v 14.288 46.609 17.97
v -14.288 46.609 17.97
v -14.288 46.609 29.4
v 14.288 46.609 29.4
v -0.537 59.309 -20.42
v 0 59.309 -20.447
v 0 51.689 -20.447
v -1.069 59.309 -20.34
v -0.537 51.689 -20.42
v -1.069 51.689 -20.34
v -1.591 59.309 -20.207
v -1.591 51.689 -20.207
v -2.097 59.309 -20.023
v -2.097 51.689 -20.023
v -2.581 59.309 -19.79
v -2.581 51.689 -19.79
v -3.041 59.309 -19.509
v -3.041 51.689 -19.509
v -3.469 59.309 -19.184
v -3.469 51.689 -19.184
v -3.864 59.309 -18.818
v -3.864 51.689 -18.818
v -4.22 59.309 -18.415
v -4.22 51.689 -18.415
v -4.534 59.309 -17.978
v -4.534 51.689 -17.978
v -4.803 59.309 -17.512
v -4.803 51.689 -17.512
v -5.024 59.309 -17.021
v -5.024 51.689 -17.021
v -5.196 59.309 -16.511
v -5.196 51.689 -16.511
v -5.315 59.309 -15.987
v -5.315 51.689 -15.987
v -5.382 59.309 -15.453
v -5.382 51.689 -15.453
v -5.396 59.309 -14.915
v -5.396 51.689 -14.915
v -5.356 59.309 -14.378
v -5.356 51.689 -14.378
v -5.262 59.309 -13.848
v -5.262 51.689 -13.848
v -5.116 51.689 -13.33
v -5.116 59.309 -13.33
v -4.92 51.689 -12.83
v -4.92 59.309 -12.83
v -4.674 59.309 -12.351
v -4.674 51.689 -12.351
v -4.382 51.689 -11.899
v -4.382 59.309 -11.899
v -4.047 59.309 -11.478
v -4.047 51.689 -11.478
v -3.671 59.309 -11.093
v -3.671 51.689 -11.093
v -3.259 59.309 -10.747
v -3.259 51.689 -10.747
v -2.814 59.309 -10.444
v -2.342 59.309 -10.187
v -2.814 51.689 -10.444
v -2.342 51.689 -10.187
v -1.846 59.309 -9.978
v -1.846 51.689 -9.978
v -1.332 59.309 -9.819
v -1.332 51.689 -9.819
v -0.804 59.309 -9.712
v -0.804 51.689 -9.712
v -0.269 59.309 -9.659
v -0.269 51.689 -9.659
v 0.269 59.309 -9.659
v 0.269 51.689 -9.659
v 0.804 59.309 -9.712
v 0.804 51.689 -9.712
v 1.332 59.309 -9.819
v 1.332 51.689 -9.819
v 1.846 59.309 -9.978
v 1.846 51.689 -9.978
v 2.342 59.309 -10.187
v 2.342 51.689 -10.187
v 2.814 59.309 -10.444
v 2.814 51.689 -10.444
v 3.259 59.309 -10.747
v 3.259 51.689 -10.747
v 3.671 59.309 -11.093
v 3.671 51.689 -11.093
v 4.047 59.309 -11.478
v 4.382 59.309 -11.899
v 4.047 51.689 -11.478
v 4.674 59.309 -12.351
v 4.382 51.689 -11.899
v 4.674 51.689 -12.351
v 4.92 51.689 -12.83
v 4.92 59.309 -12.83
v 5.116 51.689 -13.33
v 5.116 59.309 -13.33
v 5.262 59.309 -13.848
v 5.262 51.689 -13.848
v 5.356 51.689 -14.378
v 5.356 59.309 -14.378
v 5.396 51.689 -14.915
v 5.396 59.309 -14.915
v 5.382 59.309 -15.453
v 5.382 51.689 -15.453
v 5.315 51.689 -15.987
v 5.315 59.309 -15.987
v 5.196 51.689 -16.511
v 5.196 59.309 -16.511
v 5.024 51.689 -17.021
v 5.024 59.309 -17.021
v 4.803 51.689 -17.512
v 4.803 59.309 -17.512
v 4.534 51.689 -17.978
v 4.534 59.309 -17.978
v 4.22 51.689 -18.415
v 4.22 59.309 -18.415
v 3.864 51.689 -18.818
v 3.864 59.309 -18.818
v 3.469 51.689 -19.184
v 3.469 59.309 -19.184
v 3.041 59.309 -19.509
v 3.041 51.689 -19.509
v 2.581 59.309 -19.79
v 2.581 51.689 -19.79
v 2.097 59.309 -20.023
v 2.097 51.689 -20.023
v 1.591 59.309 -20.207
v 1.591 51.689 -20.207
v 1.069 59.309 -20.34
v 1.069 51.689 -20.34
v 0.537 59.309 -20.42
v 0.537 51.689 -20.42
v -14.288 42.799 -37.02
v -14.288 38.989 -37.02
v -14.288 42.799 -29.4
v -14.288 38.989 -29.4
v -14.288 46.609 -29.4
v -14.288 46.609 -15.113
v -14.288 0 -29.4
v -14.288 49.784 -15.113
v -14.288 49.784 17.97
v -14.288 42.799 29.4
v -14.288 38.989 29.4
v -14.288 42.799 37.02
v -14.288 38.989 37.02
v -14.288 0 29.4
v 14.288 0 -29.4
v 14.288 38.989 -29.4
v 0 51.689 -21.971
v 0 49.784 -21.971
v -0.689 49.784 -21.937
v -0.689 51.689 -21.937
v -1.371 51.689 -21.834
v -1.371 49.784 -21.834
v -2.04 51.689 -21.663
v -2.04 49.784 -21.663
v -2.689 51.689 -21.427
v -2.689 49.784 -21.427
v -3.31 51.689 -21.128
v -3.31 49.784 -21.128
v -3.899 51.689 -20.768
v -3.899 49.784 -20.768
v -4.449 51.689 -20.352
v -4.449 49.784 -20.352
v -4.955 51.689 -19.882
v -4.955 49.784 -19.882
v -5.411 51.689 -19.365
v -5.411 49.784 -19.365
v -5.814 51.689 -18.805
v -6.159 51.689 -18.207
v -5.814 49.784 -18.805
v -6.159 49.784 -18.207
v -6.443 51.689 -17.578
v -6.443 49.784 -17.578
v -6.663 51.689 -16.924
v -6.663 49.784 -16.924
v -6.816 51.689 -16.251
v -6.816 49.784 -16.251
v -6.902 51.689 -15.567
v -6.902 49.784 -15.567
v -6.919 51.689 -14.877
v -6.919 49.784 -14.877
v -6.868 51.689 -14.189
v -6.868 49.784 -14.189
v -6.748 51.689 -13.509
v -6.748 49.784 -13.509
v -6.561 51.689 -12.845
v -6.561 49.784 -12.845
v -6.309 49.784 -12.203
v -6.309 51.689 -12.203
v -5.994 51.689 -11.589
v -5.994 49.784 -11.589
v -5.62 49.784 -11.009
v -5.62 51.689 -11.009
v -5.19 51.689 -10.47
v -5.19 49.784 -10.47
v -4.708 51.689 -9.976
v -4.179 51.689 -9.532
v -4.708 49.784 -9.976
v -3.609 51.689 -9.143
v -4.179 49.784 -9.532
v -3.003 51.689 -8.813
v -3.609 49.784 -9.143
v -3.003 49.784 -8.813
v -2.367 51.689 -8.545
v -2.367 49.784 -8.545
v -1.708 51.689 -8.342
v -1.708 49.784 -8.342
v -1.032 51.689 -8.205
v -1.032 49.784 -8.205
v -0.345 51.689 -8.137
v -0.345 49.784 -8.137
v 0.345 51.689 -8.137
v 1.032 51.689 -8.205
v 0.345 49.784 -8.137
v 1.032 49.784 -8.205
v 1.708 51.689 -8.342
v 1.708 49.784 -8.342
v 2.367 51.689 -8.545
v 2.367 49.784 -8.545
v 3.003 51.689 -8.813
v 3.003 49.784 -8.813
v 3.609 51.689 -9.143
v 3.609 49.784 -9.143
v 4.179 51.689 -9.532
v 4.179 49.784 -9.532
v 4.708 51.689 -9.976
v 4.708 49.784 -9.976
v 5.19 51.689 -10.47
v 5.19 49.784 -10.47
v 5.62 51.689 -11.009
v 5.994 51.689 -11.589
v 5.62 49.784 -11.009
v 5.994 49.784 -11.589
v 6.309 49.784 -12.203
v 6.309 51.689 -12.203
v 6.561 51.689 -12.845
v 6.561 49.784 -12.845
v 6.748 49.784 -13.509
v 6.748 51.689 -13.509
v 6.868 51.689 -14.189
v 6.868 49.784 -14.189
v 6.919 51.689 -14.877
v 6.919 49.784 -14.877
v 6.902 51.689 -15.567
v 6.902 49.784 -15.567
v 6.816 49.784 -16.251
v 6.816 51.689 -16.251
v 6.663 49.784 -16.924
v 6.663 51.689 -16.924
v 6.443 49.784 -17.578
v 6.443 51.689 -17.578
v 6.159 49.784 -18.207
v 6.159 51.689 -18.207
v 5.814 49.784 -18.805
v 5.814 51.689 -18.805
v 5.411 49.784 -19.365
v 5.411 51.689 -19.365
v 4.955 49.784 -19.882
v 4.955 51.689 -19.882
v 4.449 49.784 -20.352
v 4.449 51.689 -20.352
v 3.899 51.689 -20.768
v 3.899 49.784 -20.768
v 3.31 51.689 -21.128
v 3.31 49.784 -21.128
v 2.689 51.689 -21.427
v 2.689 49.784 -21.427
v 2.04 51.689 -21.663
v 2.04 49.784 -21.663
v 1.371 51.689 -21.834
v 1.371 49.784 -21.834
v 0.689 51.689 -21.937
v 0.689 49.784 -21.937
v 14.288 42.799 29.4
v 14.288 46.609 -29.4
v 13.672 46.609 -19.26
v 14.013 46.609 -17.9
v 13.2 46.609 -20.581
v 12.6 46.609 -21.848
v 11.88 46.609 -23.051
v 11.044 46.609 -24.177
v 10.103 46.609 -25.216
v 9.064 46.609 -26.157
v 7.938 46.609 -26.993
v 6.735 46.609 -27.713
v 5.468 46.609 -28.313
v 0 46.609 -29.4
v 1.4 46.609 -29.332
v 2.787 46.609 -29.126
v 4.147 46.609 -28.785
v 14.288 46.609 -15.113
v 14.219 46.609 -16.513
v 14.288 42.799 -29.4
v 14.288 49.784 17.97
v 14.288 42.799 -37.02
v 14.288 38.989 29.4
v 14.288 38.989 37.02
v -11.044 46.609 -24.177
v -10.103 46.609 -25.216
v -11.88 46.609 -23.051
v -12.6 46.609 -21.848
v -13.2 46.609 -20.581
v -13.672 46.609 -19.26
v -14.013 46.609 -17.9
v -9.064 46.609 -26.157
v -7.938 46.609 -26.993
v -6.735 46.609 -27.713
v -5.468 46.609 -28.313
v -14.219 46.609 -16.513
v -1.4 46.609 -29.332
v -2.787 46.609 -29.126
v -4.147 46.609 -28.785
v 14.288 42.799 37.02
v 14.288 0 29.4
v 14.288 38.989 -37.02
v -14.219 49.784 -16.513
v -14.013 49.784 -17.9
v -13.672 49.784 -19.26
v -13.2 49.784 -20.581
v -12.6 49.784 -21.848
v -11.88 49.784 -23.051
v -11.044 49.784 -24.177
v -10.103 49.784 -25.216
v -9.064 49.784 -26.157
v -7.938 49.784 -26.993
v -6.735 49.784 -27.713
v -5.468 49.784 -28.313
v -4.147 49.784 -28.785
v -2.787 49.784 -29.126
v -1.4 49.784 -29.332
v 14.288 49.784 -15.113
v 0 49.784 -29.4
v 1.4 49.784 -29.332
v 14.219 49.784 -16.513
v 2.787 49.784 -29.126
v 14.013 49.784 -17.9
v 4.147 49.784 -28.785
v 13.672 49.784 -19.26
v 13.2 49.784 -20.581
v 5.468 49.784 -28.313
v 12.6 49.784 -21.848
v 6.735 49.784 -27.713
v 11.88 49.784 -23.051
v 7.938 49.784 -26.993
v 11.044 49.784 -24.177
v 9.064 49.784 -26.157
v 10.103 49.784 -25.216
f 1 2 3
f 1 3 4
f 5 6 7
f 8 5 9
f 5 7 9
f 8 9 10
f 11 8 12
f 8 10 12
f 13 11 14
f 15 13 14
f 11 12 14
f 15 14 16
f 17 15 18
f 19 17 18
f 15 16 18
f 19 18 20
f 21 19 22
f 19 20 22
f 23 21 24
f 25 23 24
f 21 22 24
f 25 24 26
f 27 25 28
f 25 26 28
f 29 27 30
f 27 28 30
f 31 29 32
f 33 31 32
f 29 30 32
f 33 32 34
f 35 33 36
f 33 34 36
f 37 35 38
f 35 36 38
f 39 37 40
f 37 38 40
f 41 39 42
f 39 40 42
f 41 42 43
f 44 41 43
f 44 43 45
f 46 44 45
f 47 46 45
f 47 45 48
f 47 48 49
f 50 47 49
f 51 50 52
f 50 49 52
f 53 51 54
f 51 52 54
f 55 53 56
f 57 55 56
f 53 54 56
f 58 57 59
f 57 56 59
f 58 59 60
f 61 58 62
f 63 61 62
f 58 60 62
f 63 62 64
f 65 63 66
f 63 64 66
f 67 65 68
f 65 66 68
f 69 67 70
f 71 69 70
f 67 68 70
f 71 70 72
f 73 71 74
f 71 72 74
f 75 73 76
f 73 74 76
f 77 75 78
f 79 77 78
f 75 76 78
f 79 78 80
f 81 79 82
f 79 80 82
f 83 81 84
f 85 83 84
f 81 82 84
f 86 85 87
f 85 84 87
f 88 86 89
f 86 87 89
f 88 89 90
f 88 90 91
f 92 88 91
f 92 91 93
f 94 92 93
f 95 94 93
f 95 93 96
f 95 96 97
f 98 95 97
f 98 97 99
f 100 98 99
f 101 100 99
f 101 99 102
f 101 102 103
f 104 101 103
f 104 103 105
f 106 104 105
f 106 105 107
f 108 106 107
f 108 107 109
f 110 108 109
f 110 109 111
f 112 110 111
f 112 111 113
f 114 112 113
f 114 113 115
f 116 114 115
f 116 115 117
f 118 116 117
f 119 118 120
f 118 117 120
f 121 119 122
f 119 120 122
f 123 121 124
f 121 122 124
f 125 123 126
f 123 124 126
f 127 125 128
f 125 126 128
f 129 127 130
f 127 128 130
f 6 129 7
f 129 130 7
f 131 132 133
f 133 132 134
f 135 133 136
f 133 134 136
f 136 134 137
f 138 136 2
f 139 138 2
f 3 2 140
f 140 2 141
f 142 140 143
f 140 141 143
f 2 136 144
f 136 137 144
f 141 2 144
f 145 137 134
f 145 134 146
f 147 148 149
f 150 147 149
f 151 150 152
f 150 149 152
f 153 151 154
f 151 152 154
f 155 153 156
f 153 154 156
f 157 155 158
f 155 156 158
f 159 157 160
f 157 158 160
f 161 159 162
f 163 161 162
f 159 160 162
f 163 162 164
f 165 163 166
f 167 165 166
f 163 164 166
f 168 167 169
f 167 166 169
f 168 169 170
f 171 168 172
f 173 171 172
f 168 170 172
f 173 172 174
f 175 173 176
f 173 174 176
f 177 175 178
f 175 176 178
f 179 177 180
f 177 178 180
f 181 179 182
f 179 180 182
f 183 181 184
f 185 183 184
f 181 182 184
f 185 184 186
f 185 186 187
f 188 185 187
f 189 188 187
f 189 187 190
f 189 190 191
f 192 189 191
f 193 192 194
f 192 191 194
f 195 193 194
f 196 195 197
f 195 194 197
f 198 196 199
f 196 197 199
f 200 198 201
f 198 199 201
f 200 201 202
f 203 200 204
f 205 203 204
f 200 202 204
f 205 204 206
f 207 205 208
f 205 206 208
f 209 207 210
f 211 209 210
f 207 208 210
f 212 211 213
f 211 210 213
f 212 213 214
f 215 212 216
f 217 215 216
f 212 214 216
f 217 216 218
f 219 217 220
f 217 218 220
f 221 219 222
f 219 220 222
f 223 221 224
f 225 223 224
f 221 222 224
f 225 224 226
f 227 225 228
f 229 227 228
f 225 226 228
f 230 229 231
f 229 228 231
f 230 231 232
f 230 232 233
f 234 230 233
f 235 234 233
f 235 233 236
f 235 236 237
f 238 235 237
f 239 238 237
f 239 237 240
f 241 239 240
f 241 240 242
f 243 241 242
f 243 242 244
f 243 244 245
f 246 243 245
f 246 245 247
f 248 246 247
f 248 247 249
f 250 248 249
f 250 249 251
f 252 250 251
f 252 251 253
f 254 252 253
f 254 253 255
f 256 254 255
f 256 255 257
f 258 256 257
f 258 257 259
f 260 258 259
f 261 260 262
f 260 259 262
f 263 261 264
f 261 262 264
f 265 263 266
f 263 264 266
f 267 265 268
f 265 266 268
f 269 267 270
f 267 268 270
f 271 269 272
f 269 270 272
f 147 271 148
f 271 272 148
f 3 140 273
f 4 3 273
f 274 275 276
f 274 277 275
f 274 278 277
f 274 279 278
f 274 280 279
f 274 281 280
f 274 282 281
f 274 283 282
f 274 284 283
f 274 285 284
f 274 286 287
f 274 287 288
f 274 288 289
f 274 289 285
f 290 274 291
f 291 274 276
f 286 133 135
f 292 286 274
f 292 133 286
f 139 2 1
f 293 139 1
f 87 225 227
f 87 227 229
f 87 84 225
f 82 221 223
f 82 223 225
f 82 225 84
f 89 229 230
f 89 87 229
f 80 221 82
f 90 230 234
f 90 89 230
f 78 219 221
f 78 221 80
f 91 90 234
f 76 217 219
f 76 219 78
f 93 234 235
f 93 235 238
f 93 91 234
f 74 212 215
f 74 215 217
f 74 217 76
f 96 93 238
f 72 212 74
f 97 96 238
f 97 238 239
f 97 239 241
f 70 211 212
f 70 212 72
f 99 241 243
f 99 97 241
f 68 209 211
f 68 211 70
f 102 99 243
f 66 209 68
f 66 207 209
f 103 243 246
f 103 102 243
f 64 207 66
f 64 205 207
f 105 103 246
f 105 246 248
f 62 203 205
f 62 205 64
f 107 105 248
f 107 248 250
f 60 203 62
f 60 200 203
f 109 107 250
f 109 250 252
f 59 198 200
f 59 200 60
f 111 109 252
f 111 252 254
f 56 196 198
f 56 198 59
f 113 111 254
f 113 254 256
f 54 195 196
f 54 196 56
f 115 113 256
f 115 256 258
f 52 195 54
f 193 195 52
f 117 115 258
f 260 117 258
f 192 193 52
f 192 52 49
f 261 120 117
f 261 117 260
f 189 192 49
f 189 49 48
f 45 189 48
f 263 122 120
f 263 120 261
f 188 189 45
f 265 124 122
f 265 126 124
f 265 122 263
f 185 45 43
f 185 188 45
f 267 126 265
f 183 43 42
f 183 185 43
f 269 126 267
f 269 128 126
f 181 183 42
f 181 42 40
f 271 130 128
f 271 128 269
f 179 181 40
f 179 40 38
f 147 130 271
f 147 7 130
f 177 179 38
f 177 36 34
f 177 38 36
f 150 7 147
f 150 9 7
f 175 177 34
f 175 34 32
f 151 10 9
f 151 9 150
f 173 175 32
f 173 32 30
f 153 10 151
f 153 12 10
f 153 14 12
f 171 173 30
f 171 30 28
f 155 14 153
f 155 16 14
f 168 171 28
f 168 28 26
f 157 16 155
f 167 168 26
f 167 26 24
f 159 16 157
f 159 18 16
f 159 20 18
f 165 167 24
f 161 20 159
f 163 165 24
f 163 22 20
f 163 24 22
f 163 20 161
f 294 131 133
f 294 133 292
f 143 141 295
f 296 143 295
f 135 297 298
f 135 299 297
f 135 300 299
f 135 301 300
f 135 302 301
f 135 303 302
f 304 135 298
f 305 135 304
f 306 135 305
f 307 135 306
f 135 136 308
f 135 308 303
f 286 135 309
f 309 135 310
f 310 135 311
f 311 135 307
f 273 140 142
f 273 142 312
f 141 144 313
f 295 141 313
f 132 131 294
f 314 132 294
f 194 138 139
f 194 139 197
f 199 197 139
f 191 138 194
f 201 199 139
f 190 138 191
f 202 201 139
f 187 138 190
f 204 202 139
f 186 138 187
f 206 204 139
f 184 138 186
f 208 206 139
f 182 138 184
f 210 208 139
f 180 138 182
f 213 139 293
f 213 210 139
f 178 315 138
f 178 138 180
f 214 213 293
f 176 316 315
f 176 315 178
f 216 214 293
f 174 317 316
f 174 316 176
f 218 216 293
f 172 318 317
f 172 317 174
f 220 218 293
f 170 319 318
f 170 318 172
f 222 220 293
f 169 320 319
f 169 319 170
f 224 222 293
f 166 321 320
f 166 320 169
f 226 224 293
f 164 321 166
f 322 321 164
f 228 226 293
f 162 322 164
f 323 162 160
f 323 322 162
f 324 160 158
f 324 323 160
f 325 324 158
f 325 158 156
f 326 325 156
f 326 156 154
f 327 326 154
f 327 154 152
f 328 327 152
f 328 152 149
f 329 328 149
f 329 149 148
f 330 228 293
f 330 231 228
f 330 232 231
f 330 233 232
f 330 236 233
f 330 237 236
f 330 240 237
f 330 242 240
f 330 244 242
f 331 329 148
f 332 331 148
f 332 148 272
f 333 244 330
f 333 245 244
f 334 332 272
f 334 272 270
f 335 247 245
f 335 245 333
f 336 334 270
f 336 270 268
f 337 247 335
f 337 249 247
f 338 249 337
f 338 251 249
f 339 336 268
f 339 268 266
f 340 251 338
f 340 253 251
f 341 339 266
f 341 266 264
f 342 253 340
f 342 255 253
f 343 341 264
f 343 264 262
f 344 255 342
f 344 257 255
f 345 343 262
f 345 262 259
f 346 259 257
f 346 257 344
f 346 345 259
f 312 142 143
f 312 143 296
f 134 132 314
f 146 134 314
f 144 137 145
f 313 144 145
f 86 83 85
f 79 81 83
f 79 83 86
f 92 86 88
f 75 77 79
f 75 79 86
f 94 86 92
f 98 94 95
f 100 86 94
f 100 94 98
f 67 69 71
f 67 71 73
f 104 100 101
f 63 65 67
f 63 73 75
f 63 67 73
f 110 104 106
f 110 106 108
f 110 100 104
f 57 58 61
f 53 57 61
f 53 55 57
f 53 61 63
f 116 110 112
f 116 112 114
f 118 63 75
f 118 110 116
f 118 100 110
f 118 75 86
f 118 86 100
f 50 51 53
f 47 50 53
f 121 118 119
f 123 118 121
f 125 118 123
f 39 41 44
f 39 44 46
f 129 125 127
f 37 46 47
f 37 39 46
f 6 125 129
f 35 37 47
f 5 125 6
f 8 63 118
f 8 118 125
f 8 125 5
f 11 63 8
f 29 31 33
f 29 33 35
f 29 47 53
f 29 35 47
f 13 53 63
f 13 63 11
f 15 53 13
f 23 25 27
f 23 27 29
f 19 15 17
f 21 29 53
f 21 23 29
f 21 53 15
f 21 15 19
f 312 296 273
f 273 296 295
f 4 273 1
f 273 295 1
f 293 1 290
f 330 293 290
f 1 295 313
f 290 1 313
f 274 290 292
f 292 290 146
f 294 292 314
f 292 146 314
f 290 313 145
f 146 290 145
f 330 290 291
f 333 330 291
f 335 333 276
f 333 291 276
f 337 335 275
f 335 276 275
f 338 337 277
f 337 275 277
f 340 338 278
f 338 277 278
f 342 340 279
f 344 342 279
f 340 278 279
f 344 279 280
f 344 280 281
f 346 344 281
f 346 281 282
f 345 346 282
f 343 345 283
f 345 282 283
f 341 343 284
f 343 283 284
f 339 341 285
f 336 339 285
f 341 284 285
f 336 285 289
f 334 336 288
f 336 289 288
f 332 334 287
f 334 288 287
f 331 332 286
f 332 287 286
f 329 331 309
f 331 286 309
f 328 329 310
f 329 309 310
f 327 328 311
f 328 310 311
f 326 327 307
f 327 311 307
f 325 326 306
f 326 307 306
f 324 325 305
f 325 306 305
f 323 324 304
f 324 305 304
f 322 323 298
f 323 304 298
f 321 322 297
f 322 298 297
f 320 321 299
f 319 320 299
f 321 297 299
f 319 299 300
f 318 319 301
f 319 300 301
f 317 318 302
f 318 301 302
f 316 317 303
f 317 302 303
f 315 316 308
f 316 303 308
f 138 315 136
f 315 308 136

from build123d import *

# Parameters (mm, degrees)
SKETCH2_W           = 28.575
SKETCH2_H           = 58.801
BOSS_EXTRUDE1_DEPTH = 46.609
BOSS_EXTRUDE2_START = -3.81
SKETCH3_W           = 28.575
SKETCH3_H           = 74.041
BOSS_EXTRUDE2_DEPTH = 3.81
BOSS_EXTRUDE3_DEPTH = 3.175
SKETCH5_R           = 6.9215
BOSS_EXTRUDE4_DEPTH = 1.905
SKETCH6_R           = 5.3975
BOSS_EXTRUDE5_DEPTH = 7.62


with BuildPart() as part:
    # Sketch2 → Boss-Extrude1 (new body)
    with BuildSketch(Plane(origin=(0, 0, 0), x_dir=(1, 0, 0), z_dir=(0, 1, 0))):
        Rectangle(SKETCH2_W, SKETCH2_H)
    extrude(amount=BOSS_EXTRUDE1_DEPTH)

    # Sketch3 → Boss-Extrude2 (add)
    with BuildSketch(Plane(origin=(0, 46.609, 0), x_dir=(1, 0, 0), z_dir=(0, 1, 0)).offset(BOSS_EXTRUDE2_START)):
        Rectangle(SKETCH3_W, SKETCH3_H)
    extrude(amount=-BOSS_EXTRUDE2_DEPTH)

    # Sketch4 → Boss-Extrude3 (add)
    with BuildSketch(Plane(origin=(0, 46.609, 0), x_dir=(1, 0, 0), z_dir=(0, 1, 0))):
        with BuildLine():
            Line((-14.2875, 15.113), (-14.2875, -17.9705))
            Line((-14.2875, -17.9705), (14.2875, -17.9705))
            Line((14.2875, -17.9705), (14.2875, 15.113))
            ThreePointArc((14.2875, 15.113), (0, 29.4005), (-14.2875, 15.113))
        make_face()
    extrude(amount=BOSS_EXTRUDE3_DEPTH)

    # Sketch5 → Boss-Extrude4 (add)
    with BuildSketch(Plane(origin=(0, 49.784, 0), x_dir=(1, 0, 0), z_dir=(0, 1, 0))):
        with Locations(Location((0, 15.0495, 0), (0, 0, 90))):
            Circle(SKETCH5_R)
    extrude(amount=BOSS_EXTRUDE4_DEPTH)

    # Sketch6 → Boss-Extrude5 (add)
    with BuildSketch(Plane(origin=(0, 51.689, 0), x_dir=(1, 0, 0), z_dir=(0, 1, 0))):
        with Locations(Location((0, 15.0495, 0), (0, 0, 90))):
            Circle(SKETCH6_R)
    extrude(amount=BOSS_EXTRUDE5_DEPTH)


solid = part.part
